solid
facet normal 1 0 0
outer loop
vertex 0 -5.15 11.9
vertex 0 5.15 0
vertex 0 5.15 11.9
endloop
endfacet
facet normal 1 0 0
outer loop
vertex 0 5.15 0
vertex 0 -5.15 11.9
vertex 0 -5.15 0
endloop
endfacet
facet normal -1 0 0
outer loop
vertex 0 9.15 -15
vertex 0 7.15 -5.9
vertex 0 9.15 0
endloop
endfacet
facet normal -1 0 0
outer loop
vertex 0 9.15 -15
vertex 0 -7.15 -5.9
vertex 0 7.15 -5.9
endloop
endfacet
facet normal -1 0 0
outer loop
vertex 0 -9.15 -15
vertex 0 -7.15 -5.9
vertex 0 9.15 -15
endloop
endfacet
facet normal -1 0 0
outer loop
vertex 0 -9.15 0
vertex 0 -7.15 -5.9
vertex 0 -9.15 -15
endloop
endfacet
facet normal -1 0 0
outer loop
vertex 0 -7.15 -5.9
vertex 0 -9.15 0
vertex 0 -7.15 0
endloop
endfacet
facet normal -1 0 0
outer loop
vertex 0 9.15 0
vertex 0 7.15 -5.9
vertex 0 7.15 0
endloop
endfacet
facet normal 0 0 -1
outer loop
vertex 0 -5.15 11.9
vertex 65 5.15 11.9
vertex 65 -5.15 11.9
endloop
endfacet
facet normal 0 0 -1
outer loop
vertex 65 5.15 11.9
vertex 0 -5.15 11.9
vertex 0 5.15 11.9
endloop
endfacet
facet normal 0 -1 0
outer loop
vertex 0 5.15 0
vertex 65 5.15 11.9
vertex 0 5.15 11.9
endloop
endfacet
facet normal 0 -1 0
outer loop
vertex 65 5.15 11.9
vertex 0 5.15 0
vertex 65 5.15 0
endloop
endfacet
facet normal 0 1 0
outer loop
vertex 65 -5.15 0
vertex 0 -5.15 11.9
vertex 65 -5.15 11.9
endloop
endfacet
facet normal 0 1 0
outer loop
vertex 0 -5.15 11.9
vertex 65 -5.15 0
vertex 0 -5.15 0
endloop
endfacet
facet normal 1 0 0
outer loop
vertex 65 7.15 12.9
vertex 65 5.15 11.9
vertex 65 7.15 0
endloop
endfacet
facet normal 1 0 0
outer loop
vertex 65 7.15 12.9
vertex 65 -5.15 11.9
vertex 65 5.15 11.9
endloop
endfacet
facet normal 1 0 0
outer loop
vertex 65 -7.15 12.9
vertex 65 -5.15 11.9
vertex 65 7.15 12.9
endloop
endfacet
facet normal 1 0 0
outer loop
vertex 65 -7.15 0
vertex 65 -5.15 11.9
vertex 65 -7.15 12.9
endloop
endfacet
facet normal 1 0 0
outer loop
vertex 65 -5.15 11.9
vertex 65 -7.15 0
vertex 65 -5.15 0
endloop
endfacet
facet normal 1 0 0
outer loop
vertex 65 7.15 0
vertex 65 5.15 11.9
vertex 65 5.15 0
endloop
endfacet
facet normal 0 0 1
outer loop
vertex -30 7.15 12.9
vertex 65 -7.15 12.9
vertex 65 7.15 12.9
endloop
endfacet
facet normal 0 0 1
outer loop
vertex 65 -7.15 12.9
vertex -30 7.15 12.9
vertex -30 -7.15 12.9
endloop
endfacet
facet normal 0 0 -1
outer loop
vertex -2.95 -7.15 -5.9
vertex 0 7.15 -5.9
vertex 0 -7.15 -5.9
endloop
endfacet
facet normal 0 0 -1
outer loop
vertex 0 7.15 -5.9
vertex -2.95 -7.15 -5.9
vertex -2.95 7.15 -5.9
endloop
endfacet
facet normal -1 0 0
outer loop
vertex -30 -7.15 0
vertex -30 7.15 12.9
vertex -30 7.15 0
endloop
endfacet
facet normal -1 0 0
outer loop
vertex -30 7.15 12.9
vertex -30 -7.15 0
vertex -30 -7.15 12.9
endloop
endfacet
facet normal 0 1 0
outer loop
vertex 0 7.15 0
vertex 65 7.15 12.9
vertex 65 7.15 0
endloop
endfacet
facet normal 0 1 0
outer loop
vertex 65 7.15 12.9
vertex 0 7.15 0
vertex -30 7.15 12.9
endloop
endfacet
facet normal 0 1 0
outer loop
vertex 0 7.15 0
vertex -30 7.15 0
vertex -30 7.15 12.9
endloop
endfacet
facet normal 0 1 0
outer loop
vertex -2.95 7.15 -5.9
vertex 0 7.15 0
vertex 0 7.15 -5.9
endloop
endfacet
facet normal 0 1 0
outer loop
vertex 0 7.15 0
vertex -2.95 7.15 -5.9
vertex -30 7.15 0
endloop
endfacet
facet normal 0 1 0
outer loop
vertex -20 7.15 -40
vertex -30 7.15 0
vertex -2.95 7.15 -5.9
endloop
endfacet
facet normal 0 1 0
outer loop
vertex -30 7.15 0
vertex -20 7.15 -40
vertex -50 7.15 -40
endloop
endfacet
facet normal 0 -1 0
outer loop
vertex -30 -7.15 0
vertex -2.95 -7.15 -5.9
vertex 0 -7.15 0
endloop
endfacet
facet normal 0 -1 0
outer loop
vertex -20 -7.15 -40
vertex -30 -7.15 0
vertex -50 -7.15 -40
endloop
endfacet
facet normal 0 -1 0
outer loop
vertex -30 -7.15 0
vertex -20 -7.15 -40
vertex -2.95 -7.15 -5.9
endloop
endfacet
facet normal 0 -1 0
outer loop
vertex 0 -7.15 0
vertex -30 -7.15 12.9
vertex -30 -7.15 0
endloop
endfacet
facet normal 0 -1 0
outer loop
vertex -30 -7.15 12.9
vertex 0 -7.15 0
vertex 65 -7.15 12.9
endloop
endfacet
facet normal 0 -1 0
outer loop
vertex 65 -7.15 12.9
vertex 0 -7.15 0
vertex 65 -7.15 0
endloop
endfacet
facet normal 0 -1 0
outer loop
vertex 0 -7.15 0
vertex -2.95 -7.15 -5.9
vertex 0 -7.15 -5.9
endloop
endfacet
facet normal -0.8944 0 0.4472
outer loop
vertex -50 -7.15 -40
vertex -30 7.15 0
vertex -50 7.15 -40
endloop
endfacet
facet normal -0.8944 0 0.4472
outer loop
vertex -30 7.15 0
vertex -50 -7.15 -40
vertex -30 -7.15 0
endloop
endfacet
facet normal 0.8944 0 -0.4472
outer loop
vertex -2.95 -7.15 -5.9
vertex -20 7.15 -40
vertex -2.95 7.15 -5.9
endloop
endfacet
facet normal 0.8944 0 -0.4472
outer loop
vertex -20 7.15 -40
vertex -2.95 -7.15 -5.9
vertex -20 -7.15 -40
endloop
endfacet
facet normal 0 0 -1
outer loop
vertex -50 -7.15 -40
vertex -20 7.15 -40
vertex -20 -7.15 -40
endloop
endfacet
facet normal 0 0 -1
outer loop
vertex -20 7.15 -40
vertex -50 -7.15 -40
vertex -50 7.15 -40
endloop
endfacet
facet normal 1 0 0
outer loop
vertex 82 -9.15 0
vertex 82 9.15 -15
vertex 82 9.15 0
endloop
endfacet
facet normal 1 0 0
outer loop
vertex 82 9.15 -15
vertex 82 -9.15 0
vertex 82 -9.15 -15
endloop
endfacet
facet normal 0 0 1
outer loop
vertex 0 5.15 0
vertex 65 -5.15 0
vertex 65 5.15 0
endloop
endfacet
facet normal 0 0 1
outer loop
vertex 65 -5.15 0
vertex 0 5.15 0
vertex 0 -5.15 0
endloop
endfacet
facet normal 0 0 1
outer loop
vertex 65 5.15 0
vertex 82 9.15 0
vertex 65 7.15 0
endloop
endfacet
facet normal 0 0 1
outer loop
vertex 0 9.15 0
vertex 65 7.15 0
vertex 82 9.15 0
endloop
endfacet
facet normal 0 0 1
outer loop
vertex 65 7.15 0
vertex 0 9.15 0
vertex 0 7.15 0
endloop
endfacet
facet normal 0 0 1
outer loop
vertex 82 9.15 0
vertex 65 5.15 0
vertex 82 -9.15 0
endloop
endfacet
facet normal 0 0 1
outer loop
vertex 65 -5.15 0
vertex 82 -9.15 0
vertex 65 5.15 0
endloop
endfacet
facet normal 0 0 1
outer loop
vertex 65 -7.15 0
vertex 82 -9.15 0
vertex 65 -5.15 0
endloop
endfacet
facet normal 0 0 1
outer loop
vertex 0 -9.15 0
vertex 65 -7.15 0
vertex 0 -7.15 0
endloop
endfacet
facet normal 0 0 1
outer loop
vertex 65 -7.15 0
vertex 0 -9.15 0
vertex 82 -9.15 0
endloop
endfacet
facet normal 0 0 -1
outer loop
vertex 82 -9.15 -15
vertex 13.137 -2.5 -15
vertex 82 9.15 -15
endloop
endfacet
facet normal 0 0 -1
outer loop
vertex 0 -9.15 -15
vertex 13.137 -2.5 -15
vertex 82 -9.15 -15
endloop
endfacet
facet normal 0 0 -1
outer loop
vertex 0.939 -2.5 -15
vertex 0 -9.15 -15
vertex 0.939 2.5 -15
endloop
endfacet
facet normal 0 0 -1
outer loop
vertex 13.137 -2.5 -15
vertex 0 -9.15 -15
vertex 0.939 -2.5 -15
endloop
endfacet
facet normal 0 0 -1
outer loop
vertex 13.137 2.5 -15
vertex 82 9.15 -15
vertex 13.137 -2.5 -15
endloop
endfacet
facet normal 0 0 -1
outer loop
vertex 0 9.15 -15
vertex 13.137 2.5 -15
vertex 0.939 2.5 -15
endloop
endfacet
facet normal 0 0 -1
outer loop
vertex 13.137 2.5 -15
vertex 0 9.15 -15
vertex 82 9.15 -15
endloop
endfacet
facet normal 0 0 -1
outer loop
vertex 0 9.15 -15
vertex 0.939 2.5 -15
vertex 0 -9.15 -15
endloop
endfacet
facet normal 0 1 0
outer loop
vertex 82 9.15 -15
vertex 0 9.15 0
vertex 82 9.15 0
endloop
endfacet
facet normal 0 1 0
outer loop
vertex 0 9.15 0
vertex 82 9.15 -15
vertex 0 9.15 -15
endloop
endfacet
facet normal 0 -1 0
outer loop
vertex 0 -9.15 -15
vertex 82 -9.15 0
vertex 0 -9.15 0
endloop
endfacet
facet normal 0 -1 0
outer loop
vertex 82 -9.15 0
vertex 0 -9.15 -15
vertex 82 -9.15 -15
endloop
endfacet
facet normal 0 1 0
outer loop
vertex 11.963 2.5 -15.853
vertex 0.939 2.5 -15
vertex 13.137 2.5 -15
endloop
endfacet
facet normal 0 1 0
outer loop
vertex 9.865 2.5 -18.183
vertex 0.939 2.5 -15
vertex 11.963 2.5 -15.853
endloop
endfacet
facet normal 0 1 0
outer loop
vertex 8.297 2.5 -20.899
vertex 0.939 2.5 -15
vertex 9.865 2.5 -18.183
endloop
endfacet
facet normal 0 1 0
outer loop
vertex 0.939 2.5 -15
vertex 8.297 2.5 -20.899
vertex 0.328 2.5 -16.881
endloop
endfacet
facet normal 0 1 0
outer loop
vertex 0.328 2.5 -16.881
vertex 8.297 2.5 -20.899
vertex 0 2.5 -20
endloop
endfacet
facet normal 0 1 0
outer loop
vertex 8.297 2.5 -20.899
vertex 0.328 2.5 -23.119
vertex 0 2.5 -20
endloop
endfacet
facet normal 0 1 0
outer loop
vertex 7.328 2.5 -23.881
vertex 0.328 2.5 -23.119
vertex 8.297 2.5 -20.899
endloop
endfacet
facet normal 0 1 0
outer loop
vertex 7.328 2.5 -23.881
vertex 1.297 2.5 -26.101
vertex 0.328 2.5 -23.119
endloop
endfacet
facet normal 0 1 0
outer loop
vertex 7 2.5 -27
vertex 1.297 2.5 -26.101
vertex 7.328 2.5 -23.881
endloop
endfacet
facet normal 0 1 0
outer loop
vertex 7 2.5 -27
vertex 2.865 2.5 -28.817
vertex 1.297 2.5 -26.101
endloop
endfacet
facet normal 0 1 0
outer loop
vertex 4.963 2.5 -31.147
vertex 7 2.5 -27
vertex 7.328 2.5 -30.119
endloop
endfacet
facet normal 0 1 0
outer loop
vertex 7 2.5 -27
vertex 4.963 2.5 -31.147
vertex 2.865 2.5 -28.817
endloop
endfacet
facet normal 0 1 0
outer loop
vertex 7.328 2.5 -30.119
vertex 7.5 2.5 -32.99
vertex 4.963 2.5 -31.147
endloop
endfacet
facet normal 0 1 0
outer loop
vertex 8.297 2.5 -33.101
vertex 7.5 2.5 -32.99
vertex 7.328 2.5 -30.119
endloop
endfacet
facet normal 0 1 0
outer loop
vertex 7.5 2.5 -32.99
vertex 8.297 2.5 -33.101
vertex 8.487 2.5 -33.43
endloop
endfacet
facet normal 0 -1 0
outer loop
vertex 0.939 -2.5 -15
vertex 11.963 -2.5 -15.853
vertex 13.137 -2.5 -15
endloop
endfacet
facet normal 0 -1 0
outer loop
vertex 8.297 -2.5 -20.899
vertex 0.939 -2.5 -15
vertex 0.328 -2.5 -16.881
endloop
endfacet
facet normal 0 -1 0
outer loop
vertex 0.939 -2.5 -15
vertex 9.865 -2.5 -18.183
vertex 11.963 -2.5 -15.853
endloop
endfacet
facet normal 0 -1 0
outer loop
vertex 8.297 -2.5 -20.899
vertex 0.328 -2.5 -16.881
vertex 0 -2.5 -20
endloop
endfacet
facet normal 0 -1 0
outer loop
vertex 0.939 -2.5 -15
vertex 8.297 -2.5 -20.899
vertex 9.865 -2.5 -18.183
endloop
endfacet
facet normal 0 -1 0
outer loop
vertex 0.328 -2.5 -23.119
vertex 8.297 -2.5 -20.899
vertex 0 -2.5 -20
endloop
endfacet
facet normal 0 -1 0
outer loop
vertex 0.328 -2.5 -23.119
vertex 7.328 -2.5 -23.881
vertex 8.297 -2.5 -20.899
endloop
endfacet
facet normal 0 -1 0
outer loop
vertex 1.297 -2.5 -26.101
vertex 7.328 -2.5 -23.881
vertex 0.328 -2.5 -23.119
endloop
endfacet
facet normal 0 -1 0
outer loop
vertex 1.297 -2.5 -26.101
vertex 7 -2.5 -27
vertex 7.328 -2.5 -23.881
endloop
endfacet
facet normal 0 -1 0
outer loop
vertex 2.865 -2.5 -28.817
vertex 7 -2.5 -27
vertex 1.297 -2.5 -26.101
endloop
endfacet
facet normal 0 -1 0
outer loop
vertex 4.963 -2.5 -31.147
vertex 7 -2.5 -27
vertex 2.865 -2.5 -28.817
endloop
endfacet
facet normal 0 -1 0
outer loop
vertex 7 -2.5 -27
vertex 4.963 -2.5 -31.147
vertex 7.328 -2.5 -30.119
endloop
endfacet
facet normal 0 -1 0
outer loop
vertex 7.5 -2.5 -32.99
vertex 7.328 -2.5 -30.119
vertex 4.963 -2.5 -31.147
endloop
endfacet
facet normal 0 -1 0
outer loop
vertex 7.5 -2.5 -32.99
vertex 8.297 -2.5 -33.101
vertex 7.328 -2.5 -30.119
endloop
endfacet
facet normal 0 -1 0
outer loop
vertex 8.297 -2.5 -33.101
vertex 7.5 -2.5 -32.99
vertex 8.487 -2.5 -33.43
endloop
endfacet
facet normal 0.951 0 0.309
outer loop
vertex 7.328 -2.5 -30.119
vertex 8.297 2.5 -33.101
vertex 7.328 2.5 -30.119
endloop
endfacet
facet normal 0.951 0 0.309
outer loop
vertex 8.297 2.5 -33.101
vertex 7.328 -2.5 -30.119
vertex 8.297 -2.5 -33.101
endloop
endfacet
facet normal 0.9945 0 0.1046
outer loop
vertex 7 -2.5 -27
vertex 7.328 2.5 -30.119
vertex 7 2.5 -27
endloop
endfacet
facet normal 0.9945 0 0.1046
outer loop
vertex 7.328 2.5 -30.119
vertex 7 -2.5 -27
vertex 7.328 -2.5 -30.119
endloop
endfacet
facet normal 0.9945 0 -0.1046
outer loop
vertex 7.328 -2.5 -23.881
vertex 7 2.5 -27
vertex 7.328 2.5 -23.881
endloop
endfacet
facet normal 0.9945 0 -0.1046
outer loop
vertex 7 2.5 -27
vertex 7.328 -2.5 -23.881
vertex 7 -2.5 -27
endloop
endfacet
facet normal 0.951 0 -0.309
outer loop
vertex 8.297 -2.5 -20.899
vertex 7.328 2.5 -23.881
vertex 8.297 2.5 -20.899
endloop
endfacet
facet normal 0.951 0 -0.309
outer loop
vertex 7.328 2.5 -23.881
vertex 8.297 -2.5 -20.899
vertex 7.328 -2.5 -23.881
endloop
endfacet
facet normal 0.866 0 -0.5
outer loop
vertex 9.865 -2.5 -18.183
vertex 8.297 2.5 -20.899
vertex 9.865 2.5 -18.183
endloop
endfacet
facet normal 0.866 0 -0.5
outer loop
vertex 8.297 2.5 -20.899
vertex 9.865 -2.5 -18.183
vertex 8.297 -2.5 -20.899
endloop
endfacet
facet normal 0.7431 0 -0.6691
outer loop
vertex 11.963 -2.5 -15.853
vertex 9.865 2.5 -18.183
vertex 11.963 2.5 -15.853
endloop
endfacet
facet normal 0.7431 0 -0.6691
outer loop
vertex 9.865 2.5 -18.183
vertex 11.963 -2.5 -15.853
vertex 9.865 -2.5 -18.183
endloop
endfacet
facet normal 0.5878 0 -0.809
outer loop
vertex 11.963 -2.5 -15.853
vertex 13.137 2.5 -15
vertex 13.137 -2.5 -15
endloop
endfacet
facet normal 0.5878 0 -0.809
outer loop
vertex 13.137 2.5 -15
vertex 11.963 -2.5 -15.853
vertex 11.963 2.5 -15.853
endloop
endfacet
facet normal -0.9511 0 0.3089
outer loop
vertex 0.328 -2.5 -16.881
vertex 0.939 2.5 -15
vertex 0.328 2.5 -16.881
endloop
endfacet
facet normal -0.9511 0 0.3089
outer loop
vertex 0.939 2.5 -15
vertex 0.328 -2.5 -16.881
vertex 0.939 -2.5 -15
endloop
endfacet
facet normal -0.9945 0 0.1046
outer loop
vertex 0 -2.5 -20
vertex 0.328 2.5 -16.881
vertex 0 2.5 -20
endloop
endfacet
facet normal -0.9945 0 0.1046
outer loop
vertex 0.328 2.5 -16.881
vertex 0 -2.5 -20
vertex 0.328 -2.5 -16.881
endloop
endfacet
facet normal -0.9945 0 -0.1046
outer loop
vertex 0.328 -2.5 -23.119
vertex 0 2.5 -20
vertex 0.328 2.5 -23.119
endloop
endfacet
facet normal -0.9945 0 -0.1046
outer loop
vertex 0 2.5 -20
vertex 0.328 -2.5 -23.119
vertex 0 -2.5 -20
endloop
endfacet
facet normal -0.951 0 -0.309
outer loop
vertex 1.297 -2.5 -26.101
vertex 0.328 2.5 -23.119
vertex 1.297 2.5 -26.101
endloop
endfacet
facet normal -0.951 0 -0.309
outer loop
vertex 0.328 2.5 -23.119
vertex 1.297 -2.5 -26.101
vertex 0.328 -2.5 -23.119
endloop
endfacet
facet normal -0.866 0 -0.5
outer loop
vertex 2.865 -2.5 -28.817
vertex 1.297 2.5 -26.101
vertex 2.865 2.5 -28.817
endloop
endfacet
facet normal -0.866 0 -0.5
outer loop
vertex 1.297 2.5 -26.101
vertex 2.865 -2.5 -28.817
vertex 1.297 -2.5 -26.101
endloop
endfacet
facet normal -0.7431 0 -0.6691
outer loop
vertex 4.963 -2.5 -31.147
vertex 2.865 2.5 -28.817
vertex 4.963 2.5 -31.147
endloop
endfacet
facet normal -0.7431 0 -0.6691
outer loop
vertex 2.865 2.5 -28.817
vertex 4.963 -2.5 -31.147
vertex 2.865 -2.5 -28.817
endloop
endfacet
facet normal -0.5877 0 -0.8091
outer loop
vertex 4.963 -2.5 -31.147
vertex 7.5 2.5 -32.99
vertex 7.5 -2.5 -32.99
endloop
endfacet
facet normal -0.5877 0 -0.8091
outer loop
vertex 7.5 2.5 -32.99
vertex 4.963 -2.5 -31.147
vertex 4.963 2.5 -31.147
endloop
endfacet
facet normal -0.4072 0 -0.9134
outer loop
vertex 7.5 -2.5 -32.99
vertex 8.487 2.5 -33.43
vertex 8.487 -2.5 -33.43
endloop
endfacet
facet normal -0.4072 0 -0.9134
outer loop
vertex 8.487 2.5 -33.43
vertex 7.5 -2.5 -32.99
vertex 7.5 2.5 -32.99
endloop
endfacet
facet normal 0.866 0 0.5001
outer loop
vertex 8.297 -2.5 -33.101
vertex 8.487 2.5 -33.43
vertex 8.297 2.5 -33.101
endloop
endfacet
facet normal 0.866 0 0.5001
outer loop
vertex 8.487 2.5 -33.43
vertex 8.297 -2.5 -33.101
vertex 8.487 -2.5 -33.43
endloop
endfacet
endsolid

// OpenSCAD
lighter = [23.8, 10.3, 80];
tank_h = 65;
button_l = 11;

module frame() {
    difference() {
        translate([-30, -lighter.y / 2 - 2, -(lighter.x - 5)/2 +3.5])
        cube([
            tank_h + 30,
            lighter.y + 4,
            lighter.x - 5
        ]);
        
        rotate([0, 90, 0]) lighter_module();
    }
    
    translate([0, (lighter.y + 4) / 2, 0])
    rotate([-90, 0, 180])
        linear_extrude(lighter.y + 4)
        polygon([
            [0, 0], [30, 0], [50, 40], [20, 40]
        ]);
}

module lighter_module() {   
    metal = [lighter.x + 2, lighter.y, lighter.z - tank_h];
    
    translate([0, 0, (lighter.z - metal.z) / 2]) 
    cube([lighter.x, lighter.y, lighter.z - metal.z], true);
    
    translate([1, 0, tank_h + metal.z / 2]) 
        cube(metal, true);
}

module slide() {
    translate([0, -(lighter.y + 8) / 2, -15]) 
    cube([lighter.z + 2 + 0, lighter.y + 8, 15]);
    
    translate([15, 2.5, -20])
    rotate([90, 0, 0])
    linear_extrude(5)
    difference() {
        circle(15);
        translate([7, -7, 0]) circle(15);
    }
}

%rotate([0, 90, 0]) lighter_module();
frame();
slide();
